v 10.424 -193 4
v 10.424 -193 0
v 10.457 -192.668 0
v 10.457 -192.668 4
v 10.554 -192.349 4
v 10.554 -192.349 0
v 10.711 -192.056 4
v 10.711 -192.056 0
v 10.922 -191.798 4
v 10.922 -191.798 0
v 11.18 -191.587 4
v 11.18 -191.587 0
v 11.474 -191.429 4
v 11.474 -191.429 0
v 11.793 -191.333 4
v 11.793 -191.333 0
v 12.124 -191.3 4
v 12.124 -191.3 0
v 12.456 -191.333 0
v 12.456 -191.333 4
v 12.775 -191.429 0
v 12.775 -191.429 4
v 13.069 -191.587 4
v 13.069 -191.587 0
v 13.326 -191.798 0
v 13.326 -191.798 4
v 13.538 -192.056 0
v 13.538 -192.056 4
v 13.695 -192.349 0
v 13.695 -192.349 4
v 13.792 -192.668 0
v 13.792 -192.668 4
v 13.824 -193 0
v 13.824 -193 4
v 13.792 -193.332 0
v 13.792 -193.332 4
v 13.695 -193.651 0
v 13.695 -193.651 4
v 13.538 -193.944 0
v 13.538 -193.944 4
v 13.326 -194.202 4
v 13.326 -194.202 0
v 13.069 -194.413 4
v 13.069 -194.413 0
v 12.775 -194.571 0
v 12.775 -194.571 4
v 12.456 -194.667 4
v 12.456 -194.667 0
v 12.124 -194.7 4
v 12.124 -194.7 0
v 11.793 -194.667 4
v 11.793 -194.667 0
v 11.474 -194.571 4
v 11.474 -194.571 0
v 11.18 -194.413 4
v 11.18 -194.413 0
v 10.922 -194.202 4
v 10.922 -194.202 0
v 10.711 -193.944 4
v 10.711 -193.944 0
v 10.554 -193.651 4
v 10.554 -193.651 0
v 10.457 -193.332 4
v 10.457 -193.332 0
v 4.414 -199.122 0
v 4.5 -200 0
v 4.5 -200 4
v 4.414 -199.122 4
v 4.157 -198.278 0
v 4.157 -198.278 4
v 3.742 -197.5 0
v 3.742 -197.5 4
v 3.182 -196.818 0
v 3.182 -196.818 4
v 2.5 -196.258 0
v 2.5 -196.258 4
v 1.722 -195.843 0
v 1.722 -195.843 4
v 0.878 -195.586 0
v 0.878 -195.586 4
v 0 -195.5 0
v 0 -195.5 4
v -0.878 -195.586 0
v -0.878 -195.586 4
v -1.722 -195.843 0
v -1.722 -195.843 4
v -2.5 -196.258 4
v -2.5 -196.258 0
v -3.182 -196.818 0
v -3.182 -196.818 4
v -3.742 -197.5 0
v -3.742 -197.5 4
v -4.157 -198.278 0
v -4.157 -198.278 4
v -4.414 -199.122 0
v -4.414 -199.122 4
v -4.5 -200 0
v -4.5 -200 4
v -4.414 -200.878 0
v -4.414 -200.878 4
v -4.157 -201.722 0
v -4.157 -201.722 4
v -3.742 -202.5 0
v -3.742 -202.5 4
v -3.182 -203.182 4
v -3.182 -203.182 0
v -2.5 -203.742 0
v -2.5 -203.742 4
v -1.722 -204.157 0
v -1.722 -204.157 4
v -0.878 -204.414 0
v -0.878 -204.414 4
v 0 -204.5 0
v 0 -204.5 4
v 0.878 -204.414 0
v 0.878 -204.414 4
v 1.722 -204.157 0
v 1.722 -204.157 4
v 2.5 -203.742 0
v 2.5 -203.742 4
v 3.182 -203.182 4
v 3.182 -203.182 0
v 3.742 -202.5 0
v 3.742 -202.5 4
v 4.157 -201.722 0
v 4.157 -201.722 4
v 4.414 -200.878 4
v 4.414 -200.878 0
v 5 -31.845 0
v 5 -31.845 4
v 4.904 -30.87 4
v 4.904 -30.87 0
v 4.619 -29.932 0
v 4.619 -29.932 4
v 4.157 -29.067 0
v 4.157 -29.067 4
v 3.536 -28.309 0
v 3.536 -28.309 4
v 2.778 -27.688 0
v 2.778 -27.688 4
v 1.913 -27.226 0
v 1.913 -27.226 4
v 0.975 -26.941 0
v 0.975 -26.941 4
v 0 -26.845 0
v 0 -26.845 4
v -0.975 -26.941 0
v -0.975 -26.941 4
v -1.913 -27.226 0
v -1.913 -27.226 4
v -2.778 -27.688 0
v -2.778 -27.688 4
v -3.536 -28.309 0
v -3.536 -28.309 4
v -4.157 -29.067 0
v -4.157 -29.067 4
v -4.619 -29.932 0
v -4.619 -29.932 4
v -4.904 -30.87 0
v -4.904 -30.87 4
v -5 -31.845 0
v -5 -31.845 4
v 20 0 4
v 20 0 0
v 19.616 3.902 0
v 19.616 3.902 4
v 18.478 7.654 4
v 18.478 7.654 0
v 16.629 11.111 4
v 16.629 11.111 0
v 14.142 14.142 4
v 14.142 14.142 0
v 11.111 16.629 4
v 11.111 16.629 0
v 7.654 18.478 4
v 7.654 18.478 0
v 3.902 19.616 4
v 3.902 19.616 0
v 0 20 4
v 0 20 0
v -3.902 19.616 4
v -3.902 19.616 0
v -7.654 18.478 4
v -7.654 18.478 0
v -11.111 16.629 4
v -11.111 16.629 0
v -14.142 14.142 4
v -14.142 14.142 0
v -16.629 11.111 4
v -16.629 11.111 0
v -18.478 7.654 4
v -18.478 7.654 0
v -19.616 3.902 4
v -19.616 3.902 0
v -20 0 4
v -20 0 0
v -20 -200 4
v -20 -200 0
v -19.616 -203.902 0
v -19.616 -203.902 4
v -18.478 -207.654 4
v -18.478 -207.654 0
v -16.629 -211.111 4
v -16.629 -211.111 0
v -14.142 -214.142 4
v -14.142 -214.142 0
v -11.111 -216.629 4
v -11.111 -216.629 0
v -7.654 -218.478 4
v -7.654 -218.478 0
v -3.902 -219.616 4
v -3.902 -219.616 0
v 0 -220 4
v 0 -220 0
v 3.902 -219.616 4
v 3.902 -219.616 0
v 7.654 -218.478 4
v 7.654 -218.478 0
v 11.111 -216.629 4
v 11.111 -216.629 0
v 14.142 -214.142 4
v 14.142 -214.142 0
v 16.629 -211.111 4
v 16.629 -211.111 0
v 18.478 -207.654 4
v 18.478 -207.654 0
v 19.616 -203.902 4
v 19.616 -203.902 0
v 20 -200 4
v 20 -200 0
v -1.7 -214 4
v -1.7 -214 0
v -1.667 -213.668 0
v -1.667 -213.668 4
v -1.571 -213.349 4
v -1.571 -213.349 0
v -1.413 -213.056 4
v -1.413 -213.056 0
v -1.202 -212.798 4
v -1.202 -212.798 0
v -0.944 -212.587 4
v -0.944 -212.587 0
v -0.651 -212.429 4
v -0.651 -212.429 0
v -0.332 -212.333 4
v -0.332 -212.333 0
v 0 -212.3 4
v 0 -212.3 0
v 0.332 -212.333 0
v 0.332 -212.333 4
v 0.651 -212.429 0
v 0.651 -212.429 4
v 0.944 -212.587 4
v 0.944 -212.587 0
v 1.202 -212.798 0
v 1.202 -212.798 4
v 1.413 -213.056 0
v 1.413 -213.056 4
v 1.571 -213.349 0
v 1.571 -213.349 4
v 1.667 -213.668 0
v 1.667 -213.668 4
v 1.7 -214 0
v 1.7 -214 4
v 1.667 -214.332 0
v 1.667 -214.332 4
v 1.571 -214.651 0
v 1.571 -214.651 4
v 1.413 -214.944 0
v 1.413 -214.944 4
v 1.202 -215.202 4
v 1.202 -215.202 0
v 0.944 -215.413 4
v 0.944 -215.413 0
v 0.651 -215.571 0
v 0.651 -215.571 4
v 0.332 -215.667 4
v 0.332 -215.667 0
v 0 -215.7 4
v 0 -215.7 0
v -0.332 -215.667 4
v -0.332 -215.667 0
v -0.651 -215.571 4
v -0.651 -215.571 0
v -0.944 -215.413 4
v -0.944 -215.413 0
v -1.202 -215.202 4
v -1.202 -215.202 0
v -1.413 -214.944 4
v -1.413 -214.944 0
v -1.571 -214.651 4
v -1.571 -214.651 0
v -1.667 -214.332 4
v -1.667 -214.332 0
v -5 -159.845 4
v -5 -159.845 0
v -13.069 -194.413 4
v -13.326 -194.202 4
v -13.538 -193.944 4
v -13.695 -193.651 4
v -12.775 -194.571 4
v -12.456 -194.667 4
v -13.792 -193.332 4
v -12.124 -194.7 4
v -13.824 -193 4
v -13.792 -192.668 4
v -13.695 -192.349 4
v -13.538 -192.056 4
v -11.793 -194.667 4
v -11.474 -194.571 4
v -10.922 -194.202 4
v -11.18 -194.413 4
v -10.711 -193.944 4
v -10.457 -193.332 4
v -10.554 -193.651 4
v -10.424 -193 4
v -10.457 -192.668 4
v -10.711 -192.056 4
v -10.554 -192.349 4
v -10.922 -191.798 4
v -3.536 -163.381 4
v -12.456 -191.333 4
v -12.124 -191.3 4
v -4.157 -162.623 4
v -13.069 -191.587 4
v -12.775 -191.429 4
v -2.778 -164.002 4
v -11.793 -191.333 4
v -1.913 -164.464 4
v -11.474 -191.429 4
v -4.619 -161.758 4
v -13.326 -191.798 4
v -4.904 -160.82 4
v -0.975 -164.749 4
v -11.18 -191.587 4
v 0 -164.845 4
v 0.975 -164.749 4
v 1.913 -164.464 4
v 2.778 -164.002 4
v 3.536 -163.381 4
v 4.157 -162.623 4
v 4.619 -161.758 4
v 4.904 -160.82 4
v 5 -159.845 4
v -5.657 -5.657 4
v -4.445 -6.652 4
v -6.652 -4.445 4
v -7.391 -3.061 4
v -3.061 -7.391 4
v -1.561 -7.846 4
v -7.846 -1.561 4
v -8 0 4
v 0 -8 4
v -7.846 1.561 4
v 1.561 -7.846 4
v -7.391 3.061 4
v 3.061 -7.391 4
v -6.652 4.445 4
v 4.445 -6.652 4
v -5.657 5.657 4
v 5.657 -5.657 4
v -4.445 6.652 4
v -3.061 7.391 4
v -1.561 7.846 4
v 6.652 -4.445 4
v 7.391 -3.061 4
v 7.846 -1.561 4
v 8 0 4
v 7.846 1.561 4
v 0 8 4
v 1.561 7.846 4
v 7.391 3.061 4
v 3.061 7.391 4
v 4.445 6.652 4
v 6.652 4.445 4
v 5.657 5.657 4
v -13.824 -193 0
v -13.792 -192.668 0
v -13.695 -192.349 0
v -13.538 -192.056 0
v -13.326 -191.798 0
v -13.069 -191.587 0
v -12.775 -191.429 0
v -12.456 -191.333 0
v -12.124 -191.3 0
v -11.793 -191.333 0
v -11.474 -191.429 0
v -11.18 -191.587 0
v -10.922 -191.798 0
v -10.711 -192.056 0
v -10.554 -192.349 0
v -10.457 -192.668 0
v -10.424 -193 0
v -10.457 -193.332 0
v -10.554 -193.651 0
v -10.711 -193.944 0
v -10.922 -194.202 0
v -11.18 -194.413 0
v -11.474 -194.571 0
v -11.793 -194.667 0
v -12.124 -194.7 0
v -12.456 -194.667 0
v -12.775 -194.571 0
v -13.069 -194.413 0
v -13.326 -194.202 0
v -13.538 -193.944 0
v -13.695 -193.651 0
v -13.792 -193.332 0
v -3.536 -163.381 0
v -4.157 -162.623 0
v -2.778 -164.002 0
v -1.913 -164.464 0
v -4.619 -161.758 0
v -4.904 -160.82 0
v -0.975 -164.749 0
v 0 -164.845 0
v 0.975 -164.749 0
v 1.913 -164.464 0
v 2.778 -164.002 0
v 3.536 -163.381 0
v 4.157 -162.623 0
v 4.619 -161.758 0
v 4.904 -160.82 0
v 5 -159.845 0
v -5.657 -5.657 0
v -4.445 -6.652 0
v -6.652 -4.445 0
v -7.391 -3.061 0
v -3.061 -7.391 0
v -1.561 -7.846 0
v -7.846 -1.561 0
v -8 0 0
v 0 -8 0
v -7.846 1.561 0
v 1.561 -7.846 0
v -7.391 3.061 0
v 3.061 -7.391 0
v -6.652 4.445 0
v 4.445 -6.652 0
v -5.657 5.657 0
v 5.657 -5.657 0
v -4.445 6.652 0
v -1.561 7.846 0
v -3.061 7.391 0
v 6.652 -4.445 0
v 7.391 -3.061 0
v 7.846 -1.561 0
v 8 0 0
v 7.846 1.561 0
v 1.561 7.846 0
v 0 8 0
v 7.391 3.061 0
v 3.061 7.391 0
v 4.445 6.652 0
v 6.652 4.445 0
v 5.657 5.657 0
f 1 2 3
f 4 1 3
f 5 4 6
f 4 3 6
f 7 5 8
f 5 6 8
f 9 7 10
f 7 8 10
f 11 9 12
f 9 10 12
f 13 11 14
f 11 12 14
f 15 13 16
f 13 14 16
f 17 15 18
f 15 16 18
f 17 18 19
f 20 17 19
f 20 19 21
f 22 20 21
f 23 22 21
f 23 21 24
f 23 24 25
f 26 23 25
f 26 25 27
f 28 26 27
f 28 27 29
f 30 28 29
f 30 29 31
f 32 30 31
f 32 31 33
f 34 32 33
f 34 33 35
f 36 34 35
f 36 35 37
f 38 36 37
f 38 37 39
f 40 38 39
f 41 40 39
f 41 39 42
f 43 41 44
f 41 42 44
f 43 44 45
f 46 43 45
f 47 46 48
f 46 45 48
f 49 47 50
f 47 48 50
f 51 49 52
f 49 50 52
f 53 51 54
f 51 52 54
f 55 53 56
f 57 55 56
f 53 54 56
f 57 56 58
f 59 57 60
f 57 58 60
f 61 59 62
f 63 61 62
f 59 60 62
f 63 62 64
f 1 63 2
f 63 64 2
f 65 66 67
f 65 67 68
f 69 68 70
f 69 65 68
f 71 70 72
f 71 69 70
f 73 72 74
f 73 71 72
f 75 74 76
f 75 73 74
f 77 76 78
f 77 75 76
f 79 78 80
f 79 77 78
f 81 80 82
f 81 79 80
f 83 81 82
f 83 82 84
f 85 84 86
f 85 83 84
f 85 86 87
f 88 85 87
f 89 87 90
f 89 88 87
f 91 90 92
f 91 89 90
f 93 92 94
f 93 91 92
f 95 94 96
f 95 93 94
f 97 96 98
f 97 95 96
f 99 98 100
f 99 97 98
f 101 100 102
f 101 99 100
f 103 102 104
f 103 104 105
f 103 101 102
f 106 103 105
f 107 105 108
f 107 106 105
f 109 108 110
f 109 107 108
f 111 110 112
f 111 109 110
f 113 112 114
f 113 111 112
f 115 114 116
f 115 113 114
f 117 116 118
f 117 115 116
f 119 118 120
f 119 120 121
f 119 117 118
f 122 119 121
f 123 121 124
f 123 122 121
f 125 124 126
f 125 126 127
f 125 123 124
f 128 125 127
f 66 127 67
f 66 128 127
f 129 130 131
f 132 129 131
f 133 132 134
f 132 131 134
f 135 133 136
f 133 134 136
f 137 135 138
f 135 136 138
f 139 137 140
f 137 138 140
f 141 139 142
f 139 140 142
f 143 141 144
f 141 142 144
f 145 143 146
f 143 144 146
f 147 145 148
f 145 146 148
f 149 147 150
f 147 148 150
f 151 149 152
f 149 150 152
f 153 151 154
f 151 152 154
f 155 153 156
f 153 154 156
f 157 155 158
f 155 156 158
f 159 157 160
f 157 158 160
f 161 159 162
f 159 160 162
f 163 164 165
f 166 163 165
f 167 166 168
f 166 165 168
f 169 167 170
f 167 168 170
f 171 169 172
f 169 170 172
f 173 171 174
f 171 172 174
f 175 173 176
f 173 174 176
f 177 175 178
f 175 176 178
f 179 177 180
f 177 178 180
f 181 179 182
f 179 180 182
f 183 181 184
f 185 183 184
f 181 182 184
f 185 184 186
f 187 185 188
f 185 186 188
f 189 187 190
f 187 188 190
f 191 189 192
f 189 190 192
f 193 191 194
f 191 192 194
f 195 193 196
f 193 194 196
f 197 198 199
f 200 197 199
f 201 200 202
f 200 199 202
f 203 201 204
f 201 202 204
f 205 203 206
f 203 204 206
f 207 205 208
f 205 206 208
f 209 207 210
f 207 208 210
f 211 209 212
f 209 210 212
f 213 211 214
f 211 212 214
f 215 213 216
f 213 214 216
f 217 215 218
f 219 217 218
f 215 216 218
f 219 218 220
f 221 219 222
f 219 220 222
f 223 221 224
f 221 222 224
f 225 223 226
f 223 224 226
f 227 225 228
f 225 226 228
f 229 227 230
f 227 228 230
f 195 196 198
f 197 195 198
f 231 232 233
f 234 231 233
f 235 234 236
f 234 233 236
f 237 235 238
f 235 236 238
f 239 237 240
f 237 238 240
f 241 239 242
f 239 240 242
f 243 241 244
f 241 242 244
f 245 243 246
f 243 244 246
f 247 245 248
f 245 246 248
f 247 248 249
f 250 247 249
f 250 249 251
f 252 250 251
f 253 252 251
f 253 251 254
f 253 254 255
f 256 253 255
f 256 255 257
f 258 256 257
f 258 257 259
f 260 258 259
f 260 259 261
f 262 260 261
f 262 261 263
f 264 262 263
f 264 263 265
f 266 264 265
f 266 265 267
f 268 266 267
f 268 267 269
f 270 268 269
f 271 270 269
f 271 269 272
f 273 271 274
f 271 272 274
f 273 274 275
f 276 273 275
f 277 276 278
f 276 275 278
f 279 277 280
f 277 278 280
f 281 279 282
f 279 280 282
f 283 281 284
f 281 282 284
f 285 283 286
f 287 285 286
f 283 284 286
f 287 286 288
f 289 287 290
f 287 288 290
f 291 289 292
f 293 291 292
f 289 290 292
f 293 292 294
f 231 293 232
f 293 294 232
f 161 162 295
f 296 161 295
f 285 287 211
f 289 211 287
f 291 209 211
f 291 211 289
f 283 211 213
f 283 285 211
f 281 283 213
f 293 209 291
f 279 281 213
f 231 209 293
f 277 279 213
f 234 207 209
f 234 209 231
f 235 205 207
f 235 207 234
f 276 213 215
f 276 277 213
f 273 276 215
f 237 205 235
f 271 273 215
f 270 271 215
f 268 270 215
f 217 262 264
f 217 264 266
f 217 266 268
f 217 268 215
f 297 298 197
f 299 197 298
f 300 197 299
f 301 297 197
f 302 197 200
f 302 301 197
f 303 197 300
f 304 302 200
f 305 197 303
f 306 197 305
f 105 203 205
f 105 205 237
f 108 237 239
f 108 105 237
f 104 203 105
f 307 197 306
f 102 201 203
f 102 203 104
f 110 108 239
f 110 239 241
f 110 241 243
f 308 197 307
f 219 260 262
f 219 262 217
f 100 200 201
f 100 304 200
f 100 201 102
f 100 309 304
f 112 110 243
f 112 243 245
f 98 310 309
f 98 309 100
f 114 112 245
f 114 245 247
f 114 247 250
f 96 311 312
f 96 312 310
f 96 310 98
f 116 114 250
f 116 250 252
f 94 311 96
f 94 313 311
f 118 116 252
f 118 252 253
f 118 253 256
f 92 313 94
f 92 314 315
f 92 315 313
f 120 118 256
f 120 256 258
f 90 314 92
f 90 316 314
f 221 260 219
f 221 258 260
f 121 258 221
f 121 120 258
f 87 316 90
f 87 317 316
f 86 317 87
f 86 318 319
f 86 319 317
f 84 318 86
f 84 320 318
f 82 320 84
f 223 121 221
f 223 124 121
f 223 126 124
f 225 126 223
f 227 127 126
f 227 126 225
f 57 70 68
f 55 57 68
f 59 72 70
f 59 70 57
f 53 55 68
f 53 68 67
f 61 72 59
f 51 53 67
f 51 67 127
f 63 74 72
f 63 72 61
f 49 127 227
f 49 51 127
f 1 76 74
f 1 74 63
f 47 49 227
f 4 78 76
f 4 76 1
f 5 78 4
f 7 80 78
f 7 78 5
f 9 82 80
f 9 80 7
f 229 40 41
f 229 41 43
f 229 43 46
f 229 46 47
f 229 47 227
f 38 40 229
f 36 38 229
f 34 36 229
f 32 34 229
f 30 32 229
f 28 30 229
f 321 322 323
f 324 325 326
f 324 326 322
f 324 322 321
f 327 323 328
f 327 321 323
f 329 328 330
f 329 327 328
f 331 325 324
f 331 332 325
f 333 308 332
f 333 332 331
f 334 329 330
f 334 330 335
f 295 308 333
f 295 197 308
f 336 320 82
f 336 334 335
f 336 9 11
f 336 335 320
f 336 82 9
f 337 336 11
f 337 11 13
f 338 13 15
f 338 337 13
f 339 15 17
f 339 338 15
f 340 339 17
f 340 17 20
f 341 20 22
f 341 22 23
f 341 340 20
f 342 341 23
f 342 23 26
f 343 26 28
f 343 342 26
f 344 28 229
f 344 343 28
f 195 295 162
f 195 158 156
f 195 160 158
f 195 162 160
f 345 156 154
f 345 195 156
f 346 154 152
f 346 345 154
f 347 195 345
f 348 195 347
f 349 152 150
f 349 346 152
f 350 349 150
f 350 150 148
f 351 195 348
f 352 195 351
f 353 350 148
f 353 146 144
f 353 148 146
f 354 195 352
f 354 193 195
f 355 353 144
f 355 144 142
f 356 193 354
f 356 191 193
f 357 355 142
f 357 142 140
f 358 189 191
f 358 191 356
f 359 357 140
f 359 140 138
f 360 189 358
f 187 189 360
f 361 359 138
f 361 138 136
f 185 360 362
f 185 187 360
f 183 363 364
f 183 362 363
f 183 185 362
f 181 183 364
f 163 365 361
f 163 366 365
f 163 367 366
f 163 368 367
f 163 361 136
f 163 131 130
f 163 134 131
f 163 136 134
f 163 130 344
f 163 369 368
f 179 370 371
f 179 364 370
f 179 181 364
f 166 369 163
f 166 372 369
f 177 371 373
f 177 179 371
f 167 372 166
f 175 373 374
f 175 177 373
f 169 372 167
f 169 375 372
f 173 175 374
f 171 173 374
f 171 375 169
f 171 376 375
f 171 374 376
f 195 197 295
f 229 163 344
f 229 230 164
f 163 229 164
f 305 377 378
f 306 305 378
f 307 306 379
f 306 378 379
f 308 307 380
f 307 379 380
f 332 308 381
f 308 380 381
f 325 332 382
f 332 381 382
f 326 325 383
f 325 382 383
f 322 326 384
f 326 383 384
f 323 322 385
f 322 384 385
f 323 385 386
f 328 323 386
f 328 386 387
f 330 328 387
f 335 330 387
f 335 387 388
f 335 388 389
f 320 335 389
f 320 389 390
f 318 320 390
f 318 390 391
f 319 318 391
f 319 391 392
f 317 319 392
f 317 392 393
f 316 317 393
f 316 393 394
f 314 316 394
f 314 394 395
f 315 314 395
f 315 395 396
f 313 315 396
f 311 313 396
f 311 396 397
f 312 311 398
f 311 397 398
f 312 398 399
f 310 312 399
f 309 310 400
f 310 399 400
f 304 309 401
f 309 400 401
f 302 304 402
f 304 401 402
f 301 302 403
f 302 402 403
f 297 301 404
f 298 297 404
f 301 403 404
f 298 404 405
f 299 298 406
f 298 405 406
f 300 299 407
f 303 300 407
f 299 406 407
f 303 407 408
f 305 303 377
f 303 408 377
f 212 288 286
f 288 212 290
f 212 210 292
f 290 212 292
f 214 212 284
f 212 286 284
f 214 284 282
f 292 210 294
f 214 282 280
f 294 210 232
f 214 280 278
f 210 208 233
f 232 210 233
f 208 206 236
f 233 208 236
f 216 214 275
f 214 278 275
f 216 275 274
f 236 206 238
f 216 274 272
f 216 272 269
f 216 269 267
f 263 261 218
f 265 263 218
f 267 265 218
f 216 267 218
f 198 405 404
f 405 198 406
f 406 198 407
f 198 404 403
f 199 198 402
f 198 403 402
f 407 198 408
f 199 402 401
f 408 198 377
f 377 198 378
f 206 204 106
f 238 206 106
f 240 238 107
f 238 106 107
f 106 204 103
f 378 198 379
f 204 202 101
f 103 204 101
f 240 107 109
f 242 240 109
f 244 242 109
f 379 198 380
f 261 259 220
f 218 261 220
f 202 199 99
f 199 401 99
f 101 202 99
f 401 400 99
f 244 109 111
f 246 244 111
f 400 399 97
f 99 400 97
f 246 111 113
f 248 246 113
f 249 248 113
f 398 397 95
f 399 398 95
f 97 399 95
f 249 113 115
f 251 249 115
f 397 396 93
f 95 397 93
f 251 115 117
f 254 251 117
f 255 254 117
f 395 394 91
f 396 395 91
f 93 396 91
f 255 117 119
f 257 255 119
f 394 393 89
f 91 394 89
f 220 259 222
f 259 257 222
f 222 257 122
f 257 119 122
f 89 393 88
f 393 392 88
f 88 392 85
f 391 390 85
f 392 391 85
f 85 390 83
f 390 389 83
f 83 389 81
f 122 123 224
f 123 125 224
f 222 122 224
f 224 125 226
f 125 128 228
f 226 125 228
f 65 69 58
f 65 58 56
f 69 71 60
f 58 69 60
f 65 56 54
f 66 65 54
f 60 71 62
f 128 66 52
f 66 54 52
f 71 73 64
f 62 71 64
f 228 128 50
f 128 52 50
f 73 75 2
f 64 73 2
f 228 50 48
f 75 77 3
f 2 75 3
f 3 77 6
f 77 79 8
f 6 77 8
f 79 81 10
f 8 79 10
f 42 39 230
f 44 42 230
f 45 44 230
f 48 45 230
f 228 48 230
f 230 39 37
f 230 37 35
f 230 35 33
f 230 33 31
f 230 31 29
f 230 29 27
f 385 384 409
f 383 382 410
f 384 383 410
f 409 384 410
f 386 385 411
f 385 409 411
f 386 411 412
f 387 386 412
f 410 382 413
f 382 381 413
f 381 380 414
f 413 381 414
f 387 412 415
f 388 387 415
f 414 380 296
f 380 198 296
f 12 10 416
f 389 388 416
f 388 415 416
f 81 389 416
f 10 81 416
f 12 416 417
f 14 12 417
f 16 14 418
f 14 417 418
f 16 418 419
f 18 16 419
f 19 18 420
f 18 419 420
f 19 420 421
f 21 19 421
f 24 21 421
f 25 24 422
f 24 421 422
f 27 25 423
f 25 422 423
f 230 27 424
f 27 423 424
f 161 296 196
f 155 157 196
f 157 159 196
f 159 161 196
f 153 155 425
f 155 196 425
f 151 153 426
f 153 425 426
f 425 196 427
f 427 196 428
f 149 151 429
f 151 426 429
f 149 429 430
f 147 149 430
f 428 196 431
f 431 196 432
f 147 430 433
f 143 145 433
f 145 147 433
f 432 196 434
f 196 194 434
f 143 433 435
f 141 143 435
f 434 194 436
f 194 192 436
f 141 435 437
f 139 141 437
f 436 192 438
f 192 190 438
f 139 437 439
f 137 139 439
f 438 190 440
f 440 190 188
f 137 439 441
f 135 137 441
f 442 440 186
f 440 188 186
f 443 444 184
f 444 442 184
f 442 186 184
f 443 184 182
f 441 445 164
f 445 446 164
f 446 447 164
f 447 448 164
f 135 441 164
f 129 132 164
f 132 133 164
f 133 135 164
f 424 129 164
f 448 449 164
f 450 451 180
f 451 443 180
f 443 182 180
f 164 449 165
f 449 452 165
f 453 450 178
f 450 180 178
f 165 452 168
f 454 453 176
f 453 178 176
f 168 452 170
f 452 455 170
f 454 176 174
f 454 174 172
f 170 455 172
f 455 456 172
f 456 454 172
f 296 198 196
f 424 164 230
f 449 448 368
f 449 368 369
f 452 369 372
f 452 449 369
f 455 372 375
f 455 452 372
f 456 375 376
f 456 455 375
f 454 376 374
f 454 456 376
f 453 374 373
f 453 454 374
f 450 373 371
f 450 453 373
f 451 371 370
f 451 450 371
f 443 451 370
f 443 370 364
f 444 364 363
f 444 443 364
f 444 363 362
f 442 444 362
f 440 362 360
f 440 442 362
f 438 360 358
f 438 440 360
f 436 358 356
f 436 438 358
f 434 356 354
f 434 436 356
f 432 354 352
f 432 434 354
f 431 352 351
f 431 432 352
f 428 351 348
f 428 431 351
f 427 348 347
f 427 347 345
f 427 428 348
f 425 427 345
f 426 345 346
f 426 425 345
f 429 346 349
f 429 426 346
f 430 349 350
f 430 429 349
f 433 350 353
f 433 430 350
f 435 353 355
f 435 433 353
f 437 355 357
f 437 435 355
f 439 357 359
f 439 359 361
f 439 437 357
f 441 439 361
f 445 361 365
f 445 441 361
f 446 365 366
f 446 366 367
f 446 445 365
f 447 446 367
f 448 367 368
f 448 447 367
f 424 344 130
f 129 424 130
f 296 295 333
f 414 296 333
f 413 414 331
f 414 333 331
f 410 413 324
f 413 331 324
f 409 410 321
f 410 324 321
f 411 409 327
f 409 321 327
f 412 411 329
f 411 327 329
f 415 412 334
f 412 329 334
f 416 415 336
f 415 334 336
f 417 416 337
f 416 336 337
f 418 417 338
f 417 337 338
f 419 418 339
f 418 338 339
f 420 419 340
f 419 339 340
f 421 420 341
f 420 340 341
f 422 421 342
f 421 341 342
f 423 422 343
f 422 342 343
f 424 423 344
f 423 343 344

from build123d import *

# Parameters (mm, degrees)
SKETCH_1_R          = 8
SKETCH_1_R_2        = 4.5
EXTRUDE_1_DEPTH     = 4
CUT_EXTRUDE_2_DEPTH = 221.943431674
SKETCH_3_R          = 1.7
CUT_EXTRUDE_3_DEPTH = 221.943431674


with BuildPart() as part:
    # 草图1 → 凸台-拉伸1 (new body)
    with BuildSketch(Plane.XY):
        with BuildLine():
            Line((-20, 0), (-20, -200))
            ThreePointArc((-20, -200), (0, -220), (20, -200))
            Line((20, -200), (20, 0))
            ThreePointArc((20, 0), (0, 20), (-20, 0))
        make_face()
        Circle(SKETCH_1_R, mode=Mode.SUBTRACT)
        with Locations((0, -200)):
            Circle(SKETCH_1_R_2, mode=Mode.SUBTRACT)
    extrude(amount=EXTRUDE_1_DEPTH)

    # 草图2 → 切除-拉伸2 (cut, through all)
    with BuildSketch(Plane.XY.offset(4)):
        with BuildLine():
            Line((-5, -31.845004689), (-5, -159.845004689))
            ThreePointArc((-5, -159.845004689), (0, -164.845004689), (5, -159.845004689))
            Line((5, -159.845004689), (5, -31.845004689))
            ThreePointArc((5, -31.845004689), (0, -26.845004689), (-5, -31.845004689))
        make_face()
    extrude(amount=-CUT_EXTRUDE_2_DEPTH, mode=Mode.SUBTRACT)

    # 草图3 → 切除-拉伸3 (cut, through all)
    with BuildSketch(Plane(origin=(0, 0, 0), x_dir=(-1, 0, 0), z_dir=(0, 0, -1))):
        with Locations((0, -214)):
            Circle(SKETCH_3_R)
        with Locations((-12.124355653, -193)):
            Circle(SKETCH_3_R)
        with Locations((12.124355653, -193)):
            Circle(SKETCH_3_R)
    extrude(amount=-CUT_EXTRUDE_3_DEPTH, mode=Mode.SUBTRACT)


solid = part.part
